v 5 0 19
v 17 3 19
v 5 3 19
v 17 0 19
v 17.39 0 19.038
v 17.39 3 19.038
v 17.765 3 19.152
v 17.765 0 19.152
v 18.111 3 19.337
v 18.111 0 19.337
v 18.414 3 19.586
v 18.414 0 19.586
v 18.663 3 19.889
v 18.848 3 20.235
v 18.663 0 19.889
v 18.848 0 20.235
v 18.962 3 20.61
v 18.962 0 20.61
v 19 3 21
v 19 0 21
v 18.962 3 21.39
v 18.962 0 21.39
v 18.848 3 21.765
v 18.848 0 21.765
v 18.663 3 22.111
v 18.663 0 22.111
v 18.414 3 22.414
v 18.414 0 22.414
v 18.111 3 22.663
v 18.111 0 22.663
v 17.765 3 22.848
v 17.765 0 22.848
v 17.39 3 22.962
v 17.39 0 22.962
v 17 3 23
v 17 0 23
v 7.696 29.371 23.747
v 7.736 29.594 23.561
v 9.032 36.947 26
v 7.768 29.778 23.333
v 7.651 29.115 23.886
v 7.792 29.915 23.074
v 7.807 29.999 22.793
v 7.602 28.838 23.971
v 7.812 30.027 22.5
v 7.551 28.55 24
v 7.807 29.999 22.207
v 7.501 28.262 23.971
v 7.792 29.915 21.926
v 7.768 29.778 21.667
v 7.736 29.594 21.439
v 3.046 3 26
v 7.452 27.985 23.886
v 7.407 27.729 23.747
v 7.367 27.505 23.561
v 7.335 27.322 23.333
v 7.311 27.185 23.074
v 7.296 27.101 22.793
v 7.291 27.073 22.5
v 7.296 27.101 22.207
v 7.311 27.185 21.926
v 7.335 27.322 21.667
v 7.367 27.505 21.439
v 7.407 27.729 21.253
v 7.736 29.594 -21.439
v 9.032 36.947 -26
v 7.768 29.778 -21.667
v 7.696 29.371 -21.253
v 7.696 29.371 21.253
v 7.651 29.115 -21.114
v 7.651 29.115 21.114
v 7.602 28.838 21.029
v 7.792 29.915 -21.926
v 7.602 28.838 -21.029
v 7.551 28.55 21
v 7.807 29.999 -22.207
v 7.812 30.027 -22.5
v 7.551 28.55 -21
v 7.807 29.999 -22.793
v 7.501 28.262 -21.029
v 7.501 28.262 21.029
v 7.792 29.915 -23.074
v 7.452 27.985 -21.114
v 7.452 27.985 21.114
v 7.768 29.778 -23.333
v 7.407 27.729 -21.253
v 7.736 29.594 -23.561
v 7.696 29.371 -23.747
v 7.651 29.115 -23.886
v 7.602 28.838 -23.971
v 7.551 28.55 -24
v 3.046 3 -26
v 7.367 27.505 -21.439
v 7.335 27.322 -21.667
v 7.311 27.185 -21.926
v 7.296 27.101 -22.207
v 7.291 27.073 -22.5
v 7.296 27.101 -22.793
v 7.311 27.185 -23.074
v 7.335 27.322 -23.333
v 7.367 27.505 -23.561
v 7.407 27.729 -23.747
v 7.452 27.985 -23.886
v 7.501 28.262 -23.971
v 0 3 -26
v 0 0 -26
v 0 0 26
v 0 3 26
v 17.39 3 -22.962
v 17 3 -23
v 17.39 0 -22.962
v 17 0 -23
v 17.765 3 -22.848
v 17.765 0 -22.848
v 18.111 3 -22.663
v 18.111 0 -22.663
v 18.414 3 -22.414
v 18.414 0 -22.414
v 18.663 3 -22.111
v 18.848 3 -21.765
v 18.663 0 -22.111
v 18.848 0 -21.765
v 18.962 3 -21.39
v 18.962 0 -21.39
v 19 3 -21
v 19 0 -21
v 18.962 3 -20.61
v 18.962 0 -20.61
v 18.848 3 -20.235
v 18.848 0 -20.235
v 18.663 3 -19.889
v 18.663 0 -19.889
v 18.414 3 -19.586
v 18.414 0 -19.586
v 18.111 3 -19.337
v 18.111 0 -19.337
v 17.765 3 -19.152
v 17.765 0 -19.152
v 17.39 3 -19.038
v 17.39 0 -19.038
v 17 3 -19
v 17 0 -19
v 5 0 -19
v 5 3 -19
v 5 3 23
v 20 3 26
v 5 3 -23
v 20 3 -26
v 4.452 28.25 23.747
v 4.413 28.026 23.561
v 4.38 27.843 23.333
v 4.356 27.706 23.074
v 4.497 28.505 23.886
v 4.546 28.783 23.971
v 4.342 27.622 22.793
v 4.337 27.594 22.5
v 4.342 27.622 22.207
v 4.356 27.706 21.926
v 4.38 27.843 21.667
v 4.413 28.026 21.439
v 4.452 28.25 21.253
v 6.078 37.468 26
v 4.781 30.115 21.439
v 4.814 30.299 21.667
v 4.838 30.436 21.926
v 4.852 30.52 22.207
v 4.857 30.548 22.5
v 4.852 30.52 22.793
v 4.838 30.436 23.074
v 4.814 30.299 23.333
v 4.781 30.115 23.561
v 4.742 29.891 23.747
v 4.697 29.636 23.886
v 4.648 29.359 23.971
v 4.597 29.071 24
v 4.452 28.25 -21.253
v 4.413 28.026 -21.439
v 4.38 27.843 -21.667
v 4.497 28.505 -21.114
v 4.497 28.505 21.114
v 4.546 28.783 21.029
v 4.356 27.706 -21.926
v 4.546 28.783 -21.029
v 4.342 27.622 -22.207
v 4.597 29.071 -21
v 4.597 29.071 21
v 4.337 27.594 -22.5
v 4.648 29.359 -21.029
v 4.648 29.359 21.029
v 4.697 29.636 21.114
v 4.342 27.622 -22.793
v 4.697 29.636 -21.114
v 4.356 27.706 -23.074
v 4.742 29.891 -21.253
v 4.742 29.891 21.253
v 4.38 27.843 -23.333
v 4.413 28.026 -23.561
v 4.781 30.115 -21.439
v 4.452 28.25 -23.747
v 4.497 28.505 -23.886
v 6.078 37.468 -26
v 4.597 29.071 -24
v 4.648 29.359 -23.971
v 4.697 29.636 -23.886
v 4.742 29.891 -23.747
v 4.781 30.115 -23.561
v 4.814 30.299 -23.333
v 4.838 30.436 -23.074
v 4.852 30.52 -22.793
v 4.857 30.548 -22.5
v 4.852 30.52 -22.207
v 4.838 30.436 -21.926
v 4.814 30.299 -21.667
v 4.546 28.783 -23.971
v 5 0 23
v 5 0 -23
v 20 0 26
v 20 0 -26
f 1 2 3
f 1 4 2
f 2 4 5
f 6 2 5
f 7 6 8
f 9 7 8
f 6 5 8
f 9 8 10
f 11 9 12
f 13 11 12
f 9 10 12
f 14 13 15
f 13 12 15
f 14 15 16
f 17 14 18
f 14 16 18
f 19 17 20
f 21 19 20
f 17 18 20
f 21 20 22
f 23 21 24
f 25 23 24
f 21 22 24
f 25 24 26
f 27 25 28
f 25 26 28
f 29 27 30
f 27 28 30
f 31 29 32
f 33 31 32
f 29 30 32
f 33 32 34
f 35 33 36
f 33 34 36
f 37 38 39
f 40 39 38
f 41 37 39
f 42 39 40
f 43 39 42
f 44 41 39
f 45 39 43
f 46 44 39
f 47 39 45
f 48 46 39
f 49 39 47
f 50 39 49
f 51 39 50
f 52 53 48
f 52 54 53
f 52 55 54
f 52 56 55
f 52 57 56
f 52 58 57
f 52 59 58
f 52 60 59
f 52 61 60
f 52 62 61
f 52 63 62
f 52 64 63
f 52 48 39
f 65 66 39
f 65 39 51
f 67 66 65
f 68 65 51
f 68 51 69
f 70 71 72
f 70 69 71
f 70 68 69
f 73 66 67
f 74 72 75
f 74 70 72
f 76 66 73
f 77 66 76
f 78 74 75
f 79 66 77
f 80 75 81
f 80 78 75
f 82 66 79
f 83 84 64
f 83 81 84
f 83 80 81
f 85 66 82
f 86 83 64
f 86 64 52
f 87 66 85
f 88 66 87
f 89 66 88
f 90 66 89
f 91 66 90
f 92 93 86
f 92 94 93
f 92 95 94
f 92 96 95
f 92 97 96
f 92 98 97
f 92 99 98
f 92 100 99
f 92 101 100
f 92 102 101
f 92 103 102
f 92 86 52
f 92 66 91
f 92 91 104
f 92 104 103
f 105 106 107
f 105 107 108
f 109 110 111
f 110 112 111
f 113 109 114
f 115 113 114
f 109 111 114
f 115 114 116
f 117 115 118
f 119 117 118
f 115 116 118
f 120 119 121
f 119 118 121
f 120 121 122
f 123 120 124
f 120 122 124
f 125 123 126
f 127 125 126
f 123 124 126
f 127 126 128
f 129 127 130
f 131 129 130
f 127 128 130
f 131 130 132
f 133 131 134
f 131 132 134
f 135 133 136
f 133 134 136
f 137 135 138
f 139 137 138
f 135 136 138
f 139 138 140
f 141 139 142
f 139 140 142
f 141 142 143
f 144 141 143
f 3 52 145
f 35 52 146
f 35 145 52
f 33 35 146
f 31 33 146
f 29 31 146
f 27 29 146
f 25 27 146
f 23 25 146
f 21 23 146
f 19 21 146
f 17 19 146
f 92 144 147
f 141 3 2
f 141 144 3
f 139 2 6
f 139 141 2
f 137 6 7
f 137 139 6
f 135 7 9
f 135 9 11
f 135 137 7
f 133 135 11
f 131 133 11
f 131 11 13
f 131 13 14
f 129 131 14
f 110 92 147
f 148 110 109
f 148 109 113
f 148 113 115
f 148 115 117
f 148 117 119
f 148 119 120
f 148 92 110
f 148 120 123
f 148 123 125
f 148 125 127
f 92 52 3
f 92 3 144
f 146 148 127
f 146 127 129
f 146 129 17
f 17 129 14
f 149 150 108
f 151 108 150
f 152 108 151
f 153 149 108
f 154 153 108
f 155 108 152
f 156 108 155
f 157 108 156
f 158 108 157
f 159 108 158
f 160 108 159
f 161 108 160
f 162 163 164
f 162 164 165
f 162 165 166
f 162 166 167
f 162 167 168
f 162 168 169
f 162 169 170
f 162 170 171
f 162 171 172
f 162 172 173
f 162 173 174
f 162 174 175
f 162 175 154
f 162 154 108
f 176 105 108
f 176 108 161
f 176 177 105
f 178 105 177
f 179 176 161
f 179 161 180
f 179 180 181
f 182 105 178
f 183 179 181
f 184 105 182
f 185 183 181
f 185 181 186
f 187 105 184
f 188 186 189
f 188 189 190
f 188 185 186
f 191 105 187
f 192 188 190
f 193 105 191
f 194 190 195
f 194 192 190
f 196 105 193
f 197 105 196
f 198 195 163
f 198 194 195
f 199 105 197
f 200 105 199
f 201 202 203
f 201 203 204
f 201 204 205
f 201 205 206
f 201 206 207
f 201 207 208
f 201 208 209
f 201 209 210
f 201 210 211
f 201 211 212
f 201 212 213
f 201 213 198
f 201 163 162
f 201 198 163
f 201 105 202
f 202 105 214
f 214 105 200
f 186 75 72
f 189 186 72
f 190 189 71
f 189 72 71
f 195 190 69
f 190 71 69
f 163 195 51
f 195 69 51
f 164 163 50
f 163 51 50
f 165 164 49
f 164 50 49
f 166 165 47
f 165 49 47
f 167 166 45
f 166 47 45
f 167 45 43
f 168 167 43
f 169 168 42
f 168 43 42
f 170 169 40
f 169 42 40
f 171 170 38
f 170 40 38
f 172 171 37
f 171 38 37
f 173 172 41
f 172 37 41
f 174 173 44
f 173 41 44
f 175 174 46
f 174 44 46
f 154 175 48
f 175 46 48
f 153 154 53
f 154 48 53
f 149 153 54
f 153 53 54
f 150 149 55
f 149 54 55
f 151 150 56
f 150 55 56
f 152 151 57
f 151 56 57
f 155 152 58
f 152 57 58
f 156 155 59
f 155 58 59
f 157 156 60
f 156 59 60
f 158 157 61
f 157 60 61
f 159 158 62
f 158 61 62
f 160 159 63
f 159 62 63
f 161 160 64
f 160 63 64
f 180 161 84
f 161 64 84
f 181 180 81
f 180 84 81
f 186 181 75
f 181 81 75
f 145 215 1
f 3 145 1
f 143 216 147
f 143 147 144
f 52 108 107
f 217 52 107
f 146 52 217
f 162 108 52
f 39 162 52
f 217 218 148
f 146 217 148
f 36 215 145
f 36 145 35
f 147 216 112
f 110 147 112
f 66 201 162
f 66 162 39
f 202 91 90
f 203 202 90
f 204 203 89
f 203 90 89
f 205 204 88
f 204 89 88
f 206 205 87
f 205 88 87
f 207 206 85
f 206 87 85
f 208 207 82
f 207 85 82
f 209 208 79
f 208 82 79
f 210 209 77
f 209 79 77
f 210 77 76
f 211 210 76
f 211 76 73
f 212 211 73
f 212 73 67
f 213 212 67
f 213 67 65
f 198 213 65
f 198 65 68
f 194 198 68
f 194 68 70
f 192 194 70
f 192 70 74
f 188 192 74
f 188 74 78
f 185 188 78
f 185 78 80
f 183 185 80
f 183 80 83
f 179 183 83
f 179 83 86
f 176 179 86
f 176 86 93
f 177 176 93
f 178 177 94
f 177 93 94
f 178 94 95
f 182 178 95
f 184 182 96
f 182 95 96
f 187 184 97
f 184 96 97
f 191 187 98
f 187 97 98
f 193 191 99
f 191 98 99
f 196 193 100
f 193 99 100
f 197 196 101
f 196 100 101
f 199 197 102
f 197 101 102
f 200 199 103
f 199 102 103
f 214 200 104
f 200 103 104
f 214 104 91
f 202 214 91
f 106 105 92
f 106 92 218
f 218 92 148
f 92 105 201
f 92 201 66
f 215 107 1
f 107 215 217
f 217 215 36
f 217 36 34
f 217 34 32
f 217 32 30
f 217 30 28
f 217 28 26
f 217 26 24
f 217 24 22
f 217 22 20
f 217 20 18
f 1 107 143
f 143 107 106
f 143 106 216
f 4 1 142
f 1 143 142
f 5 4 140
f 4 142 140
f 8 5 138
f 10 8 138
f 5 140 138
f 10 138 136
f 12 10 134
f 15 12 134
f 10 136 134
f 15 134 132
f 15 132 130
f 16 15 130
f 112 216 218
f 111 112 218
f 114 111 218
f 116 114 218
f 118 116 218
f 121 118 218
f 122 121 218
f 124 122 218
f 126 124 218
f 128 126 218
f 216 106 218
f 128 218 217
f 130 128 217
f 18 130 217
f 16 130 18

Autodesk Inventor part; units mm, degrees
ref_plane "YZ Plane" through (0, 0, 0) normal (1, 0, 0) x (0, 1, 0)
ref_plane "XZ Plane" through (0, 0, 0) normal (0, 1, 0) x (-1, 0, 0)
ref_plane "XY Plane" through (0, 0, 0) normal (0, 0, 1) x (1, 0, 0)
sketch "Sketch1" plane through (0, 0, 0) normal (1, 0, 0) x (0, 1, 0)
  point P0 (0, 0)
sketch "Sketch2" plane through (0, 0, 0) normal (0, 0, 1) x (1, 0, 0)
  line L0 (0, 0) -> (20, 0)
  line L1 (20, 0) -> (20, 3)
  line L2 (0, 0) -> (0, 3)
  line L3 (0, 3) -> (6.0777, 37.4683)
  line L4 (0, 3) -> (35, 3) construction
  line L5 (6.0777, 37.4683) -> (9.0321, 36.9473)
  line L6 (9.0321, 36.9473) -> (3.0463, 3)
  line L7 (3.0463, 3) -> (20, 3)
  dimension "d0" = 20
  dimension "d1" = 3
  dimension "d2" = 3
  dimension "d4" = 35
  dimension "d5" = 80
  dimension "d6" = 3
extrude "Extrusion1" add sketch "Sketch2" along normal blind 26 and the other way blind 26
ref_plane "Work Plane1" through (7.5549, 37.2078, 26) normal (0.9848, -0.1736, 0) x (0, 0, -1)
ref_plane "Work Plane2" through (0, 0, 0) normal (0, 0, 1) x (1, 0, 0)
sketch "Sketch3" plane through (9.0321, 36.9473, 26) normal (0.9848, -0.1736, 0) x (0, 0, -1)
  point P0 (26, -37.9544)
sketch "Sketch4" plane through (9.0321, 36.9473, 26) normal (0.9848, -0.1736, 0) x (0, 0, -1)
  circle A0 centre (3.5, -8.527) radius 1.5
  circle A1 centre (48.5, -8.527) radius 1.5
  point P0 (26, -37.9544)
  dimension "d11" = 3
  dimension "d12" = 3
extrude "Extrusion2" cut sketch "Sketch4" against normal blind 3 contours A0
sketch "Sketch5" plane through (9.0321, 36.9473, 26) normal (0.9848, -0.1736, 0) x (0, 0, -1)
  circle A0 centre (48.5, -8.527) radius 1.5
  point P0 (26, -37.9544)
  dimension "d15" = 3
extrude "Extrusion3" cut sketch "Sketch5" against normal blind 3
sketch "Sketch6" plane through (3.0463, 3, 26) normal (0, 1, 0) x (1, 0, 0)
  point P0 (-3.0463, 26)
sketch "Sketch7" plane through (0, 0, 26) normal (0, -1, 0) x (1, 0, 0)
  line L0 (6.0777, -52) -> (6.0777, 0) projected
  line L1 (5, -3) -> (17, -3)
  line L2 (17, -7) -> (5, -7)
  arc A0 (17, -7) -> (17, -3) centre (17, -5) ccw
  line L3 (5, -3) -> (5, -7)
  ellipse E0 centre (4.597, -3.5) end of major axis (4.597, -2) minor radius 0.2605 projected
  line L4 (20, -52) -> (20, 0) projected
  line L5 (5, -49) -> (17, -49)
  line L6 (17, -45) -> (5, -45)
  arc A1 (17, -49) -> (17, -45) centre (17, -47) ccw
  line L7 (5, -49) -> (5, -45)
  point P0 (0, -26)
  dimension "d19" = 12
extrude "Extrusion4" cut sketch "Sketch7" against normal blind 3 contours L5 L7 L6 L0 | L2 L3 L1 L0 | L0 L1 A0 L2 | L0 L6 A1 L5
